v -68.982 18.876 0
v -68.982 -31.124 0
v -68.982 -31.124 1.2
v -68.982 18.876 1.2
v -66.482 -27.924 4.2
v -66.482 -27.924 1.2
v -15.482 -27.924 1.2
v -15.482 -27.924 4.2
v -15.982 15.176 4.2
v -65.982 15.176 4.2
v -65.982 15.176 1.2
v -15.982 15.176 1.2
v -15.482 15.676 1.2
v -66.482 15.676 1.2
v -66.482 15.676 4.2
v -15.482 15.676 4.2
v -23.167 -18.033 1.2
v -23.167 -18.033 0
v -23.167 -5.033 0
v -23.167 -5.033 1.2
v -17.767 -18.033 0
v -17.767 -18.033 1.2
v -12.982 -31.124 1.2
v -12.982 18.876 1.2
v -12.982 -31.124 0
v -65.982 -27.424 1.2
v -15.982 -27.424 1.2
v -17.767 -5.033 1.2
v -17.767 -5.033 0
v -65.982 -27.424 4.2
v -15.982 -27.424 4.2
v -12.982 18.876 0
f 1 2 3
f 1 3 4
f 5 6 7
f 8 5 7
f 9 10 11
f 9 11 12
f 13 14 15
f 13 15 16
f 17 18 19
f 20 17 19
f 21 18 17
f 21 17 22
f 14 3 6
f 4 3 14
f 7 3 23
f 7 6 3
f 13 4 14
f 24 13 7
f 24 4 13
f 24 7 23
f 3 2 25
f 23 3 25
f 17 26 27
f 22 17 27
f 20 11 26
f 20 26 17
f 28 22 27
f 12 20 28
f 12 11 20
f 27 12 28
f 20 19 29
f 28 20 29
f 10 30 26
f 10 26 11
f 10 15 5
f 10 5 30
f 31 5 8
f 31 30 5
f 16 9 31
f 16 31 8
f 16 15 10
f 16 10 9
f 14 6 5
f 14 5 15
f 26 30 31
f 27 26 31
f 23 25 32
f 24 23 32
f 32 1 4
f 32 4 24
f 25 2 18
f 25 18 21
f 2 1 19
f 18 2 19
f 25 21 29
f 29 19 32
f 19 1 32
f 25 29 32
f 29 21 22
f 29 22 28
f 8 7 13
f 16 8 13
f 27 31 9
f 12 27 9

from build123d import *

# Parameters (mm, degrees)
F0_W     = 56
F0_H     = 50
F1_DEPTH = 1.2
F2_W     = 5.4
F2_H     = 13
F3_DEPTH = 1.2
F4_W     = 51
F4_H     = 43.6
F4_W_2   = 5.4
F4_H_2   = 13
F5_DEPTH = 3
F6_W     = 50
F6_H     = 42.6
F7_DEPTH = 3


with BuildPart() as f1:
    # F0 (on Top) → F1 (new body)
    with BuildSketch(Plane.XY):
        with Locations((-40.981666, -6.123801)):
            Rectangle(F0_W, F0_H)
    extrude(amount=F1_DEPTH)

    # F2 (on face) → F3 (cut)
    with BuildSketch(Plane.XY.offset(1.2)):
        with Locations((-20.466588, -11.532844)):
            Rectangle(F2_W, F2_H)
    extrude(amount=-F3_DEPTH, mode=Mode.SUBTRACT)

    # F4 (on face) → F5 (join)
    with BuildSketch(Plane.XY.offset(1.2)):
        with Locations((-40.981666, -6.123801)):
            Rectangle(F4_W, F4_H)
        with Locations((-20.466588, -11.532844)):
            Rectangle(F4_W_2, F4_H_2, mode=Mode.SUBTRACT)
    extrude(amount=F5_DEPTH)

    # F6 (on face) → F7 (cut)
    with BuildSketch(Plane.XY.offset(4.2)):
        with Locations((-40.981666, -6.123801)):
            Rectangle(F6_W, F6_H)
    extrude(amount=-F7_DEPTH, mode=Mode.SUBTRACT)


solid = f1.part
